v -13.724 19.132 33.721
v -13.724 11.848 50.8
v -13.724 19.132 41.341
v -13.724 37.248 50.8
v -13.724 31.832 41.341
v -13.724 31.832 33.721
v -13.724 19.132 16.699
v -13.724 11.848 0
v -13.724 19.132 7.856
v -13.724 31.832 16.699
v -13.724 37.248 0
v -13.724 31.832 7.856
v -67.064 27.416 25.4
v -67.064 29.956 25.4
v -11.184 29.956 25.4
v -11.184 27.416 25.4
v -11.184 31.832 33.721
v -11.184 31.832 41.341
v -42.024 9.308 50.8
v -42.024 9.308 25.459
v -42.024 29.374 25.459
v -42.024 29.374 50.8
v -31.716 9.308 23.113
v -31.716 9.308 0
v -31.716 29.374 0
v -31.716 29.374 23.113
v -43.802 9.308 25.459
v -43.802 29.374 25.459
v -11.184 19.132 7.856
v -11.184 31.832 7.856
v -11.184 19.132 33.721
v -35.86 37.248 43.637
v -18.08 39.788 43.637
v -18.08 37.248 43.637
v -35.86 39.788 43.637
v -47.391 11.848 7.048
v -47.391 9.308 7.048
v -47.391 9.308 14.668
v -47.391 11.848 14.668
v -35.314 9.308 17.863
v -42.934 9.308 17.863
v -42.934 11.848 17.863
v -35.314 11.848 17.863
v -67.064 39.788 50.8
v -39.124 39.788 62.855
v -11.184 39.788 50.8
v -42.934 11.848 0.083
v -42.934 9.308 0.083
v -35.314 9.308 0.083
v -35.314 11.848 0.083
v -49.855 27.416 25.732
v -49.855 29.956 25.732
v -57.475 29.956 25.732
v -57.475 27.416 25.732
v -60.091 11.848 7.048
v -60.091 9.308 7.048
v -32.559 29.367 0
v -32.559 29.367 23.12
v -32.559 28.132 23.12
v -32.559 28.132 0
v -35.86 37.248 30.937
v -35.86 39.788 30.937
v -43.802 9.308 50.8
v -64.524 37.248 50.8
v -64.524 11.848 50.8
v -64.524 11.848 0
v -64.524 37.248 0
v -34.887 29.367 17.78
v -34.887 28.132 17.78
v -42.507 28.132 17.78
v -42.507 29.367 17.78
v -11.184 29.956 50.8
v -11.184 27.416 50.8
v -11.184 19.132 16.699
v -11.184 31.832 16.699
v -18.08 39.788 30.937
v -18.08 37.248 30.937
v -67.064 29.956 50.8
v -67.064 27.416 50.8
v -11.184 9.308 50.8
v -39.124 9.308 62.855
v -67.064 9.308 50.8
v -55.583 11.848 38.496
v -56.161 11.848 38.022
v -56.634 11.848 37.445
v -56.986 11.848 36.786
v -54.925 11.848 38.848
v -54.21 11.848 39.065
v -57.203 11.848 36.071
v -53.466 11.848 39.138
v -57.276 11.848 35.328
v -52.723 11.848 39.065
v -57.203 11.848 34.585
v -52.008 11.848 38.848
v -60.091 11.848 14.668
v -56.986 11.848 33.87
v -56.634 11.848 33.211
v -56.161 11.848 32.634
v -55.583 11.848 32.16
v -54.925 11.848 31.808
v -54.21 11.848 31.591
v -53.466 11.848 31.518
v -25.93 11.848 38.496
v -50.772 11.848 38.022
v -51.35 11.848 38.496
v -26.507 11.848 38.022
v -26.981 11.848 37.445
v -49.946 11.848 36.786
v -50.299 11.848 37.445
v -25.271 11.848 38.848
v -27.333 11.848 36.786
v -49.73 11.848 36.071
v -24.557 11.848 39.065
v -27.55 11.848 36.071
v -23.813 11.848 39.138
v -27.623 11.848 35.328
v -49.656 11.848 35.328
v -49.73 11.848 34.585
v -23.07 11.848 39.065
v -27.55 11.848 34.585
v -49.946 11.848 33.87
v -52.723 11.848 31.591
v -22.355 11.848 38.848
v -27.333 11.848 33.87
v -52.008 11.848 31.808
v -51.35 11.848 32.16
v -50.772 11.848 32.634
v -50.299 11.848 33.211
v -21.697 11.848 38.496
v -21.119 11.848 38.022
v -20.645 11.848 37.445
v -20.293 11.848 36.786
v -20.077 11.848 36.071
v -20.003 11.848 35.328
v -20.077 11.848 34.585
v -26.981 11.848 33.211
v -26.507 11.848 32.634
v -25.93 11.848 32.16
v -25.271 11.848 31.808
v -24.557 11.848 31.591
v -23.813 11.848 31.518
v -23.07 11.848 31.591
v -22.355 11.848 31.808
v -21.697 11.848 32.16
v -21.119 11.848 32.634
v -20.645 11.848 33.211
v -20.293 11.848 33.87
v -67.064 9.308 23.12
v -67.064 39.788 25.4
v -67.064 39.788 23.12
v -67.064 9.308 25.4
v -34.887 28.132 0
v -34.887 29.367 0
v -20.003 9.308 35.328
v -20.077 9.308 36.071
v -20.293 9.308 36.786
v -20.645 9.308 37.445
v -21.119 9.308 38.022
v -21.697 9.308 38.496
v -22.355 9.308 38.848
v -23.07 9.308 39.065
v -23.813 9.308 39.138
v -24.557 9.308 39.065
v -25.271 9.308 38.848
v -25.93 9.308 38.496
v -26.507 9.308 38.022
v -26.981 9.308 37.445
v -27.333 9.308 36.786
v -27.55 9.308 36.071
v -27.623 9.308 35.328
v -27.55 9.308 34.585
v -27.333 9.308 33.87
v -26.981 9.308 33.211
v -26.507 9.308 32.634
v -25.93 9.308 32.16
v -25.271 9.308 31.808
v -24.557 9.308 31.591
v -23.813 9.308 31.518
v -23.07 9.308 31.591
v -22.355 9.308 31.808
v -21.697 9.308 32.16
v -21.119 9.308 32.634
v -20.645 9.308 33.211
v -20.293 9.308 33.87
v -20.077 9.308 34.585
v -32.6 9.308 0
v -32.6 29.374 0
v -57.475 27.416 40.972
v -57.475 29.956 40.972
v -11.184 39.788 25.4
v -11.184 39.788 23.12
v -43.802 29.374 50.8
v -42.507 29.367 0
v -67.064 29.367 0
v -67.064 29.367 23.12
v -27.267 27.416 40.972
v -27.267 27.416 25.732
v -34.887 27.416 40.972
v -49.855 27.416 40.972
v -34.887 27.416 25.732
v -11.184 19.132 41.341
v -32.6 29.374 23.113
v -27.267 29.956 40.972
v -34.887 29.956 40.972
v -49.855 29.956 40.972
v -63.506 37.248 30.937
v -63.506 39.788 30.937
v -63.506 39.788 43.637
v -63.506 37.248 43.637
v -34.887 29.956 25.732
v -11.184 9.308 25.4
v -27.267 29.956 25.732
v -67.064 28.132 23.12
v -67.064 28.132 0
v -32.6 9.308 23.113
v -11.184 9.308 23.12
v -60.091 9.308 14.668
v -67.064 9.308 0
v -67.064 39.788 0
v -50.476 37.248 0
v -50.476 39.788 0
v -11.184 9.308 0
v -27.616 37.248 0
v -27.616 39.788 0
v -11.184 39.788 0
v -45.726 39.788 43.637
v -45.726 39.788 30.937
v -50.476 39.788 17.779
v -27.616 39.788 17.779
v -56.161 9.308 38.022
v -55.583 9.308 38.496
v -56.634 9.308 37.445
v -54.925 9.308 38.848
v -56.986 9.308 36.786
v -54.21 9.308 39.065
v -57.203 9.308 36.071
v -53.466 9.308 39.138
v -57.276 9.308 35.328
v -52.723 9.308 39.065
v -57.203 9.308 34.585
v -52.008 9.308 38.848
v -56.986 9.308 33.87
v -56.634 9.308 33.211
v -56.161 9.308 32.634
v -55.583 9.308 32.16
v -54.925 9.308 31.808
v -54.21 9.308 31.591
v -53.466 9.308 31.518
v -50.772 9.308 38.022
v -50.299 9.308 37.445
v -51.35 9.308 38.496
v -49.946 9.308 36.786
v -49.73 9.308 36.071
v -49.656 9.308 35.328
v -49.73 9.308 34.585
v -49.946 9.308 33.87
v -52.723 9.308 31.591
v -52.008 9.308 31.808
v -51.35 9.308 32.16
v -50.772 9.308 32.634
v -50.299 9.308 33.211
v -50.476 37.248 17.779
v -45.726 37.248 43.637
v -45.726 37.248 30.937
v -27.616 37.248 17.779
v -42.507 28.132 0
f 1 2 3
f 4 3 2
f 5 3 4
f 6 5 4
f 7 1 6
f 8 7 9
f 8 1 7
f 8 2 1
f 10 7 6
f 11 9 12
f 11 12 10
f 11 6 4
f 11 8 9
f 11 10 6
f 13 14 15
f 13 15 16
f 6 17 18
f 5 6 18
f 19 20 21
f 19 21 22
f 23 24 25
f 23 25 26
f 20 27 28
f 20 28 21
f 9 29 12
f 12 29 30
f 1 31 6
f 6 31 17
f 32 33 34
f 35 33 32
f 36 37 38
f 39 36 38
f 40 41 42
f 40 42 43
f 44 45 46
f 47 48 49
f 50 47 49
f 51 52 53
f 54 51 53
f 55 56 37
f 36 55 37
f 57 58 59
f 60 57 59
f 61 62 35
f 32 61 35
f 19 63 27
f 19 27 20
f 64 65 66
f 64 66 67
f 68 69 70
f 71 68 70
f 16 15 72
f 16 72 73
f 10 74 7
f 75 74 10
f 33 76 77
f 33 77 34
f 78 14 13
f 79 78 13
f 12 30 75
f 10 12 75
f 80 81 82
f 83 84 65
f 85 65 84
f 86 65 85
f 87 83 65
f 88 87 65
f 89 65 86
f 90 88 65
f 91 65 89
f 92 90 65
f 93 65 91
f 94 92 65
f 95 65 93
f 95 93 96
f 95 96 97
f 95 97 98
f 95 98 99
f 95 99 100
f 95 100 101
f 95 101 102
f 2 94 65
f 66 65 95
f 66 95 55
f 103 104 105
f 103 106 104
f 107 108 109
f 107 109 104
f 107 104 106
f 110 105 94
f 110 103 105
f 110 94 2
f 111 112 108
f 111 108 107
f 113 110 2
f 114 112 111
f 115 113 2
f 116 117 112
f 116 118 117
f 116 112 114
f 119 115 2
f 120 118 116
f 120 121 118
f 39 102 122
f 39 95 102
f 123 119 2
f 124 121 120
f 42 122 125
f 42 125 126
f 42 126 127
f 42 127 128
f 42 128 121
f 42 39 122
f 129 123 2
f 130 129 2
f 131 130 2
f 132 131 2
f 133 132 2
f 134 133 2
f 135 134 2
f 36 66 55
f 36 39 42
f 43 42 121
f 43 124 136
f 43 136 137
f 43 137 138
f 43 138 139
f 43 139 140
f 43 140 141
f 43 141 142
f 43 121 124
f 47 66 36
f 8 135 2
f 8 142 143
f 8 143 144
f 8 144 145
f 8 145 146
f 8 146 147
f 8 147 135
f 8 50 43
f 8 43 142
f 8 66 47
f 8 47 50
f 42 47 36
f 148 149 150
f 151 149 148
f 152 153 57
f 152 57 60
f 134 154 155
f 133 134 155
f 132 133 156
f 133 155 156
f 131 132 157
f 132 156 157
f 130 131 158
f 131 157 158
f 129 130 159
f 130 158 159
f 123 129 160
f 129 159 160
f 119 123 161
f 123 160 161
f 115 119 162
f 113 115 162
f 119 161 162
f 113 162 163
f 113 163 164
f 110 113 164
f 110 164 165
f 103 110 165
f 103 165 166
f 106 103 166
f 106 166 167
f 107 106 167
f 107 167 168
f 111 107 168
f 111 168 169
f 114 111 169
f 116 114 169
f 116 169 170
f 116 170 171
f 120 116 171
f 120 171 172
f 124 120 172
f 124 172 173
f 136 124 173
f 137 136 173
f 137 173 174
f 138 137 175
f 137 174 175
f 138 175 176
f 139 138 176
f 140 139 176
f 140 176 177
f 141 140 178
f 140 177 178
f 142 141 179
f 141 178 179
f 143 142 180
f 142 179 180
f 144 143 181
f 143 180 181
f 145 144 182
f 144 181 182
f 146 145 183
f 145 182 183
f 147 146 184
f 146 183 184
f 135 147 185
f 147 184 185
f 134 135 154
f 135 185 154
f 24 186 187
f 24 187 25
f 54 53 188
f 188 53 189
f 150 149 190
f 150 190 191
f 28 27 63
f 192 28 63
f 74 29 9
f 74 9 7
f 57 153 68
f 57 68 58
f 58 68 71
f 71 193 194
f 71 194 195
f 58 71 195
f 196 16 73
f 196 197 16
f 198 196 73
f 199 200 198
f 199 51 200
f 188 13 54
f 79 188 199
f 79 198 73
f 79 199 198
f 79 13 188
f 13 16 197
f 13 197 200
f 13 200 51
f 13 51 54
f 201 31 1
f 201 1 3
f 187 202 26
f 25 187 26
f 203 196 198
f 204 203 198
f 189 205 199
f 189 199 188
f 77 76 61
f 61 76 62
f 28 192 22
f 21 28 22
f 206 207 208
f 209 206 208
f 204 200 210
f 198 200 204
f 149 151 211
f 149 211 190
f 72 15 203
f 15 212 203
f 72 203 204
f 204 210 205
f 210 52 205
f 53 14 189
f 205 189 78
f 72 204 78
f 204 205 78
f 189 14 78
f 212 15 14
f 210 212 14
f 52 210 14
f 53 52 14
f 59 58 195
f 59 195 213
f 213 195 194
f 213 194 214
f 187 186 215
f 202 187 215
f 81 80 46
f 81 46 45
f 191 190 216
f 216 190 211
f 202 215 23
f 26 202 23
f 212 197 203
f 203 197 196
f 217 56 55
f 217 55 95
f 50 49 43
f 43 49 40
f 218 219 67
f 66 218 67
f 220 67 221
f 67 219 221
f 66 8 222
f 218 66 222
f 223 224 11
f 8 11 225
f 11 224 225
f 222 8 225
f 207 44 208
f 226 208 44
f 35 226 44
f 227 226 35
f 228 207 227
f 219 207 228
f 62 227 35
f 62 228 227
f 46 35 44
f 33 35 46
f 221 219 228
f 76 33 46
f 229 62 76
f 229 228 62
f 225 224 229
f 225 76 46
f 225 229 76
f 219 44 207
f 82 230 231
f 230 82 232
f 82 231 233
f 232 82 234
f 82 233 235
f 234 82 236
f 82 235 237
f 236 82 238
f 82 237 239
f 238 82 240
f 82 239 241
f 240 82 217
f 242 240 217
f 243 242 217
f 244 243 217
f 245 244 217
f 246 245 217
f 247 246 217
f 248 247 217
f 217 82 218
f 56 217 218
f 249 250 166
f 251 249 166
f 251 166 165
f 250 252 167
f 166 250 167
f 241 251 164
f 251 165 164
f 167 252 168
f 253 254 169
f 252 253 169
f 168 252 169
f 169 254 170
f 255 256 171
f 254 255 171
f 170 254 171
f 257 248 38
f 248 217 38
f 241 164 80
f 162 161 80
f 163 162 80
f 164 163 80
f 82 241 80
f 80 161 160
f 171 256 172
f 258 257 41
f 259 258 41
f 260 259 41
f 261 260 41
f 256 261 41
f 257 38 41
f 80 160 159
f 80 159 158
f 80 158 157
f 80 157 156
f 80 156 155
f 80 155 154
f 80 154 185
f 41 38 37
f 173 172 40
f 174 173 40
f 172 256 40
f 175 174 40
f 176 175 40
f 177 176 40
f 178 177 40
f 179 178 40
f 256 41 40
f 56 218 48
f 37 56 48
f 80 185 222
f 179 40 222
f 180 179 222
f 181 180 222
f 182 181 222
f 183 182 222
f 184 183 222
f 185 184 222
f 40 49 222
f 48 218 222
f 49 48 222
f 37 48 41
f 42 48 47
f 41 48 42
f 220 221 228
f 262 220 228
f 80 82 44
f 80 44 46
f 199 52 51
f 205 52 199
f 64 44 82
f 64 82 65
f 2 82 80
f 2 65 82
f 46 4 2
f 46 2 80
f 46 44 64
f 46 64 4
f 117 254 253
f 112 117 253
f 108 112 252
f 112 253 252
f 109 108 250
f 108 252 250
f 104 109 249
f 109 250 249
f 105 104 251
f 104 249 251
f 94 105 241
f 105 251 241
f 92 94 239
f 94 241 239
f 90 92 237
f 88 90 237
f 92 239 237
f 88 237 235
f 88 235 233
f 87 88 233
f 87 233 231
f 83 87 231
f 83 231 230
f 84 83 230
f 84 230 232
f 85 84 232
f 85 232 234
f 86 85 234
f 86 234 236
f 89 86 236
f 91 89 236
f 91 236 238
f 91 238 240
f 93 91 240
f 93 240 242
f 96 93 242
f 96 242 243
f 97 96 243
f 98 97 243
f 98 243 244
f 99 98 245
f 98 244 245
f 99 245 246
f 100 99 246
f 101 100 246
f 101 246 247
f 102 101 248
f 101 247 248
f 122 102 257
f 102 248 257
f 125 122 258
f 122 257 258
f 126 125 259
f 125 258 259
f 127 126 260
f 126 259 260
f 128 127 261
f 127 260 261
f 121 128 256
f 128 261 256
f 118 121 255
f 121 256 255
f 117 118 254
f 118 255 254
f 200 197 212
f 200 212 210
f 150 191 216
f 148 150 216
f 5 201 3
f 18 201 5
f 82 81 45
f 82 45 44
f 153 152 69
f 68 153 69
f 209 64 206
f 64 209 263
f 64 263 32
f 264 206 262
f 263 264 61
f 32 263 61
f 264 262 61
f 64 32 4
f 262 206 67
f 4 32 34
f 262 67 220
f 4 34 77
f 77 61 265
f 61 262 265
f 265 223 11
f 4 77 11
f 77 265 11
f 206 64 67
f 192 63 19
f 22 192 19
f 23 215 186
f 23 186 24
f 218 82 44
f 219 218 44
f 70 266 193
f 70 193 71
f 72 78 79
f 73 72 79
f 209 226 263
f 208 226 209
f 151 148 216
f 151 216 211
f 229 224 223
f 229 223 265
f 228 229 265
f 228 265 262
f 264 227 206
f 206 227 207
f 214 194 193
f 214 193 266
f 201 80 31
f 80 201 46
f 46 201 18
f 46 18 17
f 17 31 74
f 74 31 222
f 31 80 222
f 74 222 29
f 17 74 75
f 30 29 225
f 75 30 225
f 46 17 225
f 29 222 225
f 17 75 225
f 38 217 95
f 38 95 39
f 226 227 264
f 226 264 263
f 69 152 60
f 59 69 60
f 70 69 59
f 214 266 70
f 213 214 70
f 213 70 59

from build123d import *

# Parameters (mm, degrees)
F0_W      = 55.88
F0_H      = 30.48
F0_W_2    = 50.8
F0_H_2    = 25.4
F1_DEPTH  = 50.8
F4_DEPTH  = 55.88
F3_W      = 1.2348946184
F3_H      = 23.1199190021
F5_DEPTH  = 34.5059
F2_W      = 0.8848570287
F2_H      = 23.1127515435
F6_DEPTH  = 20.066
F2_W_2    = 1.778
F2_H_2    = 25.3409488678
F2_R      = 3.81
F2_W_3    = 7.62
F2_H_3    = 17.78
F2_W_4    = 12.7
F2_H_4    = 7.62
F7_DEPTH  = 12.7
F8_DEPTH  = 30.48
F3_W_2    = 2.54
F3_H_2    = 25.4
F9_DEPTH  = 55.88
F10_W     = 7.62
F10_H     = 17.78
F10_H_2   = 15.24
F11_DEPTH = 3.81
F12_W     = 12.7
F12_H     = 7.62
F12_H_2   = 8.8426265866
F13_DEPTH = 3.048
F14_W     = 17.78
F14_H     = 12.7
F14_W_2   = 22.86
F14_H_2   = 17.7792217582
F15_DEPTH = 5.08


with BuildPart() as f1:
    # F0 (on Top) → F1 (new body)
    with BuildSketch(Plane.XY):
        with Locations((-39.1244925559, 24.5484983528)):
            Rectangle(F0_W, F0_H)
        with Locations((-39.1244925559, 24.5484983528)):
            Rectangle(F0_W_2, F0_H_2, mode=Mode.SUBTRACT)
    extrude(amount=F1_DEPTH)

    # F2 (on face) → F7 (cut)
    with BuildSketch(Plane.XZ.offset(-9.3084983528)):
        with Locations((-53.4664802253, 35.3280678391)):
            Circle(F2_R)
        with Locations((-23.8133892417, 35.3280678391)):
            Circle(F2_R)
        with Locations((-39.1244925559, 8.9734215289)):
            Rectangle(F2_W_3, F2_H_3)
        with Locations((-53.7414518952, 10.8576564579)):
            Rectangle(F2_W_4, F2_H_4)
    extrude(amount=-F7_DEPTH, mode=Mode.SUBTRACT)

    # F12 (on face) → F13 (cut)
    with BuildSketch(Plane.YZ.offset(-11.1844925559)):
        with Locations((25.4817003548, 37.5306944823)):
            Rectangle(F12_W, F12_H)
        with Locations((25.4817003548, 12.277324684)):
            Rectangle(F12_W, F12_H_2)
    extrude(amount=-F13_DEPTH, mode=Mode.SUBTRACT)

    # F14 (on face) → F15 (cut)
    with BuildSketch(Plane(origin=(0, 39.7884983528, 0), x_dir=(-1, 0, 0), z_dir=(0, 1, 0))):
        with Locations((26.9698910415, 37.2866503894)):
            Rectangle(F14_W, F14_H)
        with Locations((54.6161755919, 37.2866503894)):
            Rectangle(F14_W, F14_H)
        with Locations((39.0458321649, 8.8896108791)):
            Rectangle(F14_W_2, F14_H_2)
    extrude(amount=-F15_DEPTH, mode=Mode.SUBTRACT)


with BuildPart() as f4:
    # F3 (on face) → F4 (new body)
    with BuildSketch(Plane(origin=(-67.0644925559, 0, 0), x_dir=(0, -1, 0), z_dir=(-1, 0, 0))):
        Polygon((-29.9556218088, 25.4), (-39.7884983528, 25.4), (-39.7884983528, 23.1199190021), (-29.3668583035, 23.1199190021), (-28.1319636852, 23.1199190021), (-9.3084983528, 23.1199190021), (-9.3084983528, 25.4), (-27.4156218088, 25.4), align=None)
    extrude(amount=-F4_DEPTH)


with BuildPart() as f5:
    # F3 (on face) → F5 (new body)
    with BuildSketch(Plane(origin=(-67.0644925559, 0, 0), x_dir=(0, -1, 0), z_dir=(-1, 0, 0))):
        with Locations((-28.7494109944, 11.559959501)):
            Rectangle(F3_W, F3_H)
    extrude(amount=-F5_DEPTH)


with BuildPart() as f6:
    # F2 (on face) → F6 (new body)
    with BuildSketch(Plane.XZ.offset(-9.3084983528)):
        with Locations((-32.1580264717, 11.5563757718)):
            Rectangle(F2_W, F2_H)
    extrude(amount=-F6_DEPTH)


with BuildPart() as f6b:
    # F2 (on face) → F6, piece 2 (new body)
    with BuildSketch(Plane.XZ.offset(-9.3084983528)):
        with Locations((-42.9128897204, 38.1295255661)):
            Rectangle(F2_W_2, F2_H_2)
    extrude(amount=-F6_DEPTH)


with BuildPart() as f8:
    # F2 (on face) → F8 (new body)
    with BuildSketch(Plane.XZ.offset(-9.3084983528)):
        Polygon((-39.1244925559, 62.8553926945), (-67.0644925559, 50.8), (-43.8018897204, 50.8), (-42.0238897204, 50.8), (-11.1844925559, 50.8), align=None)
    extrude(amount=-F8_DEPTH)


with BuildPart() as f9:
    # F3 (on face) → F9 (new body)
    with BuildSketch(Plane(origin=(-67.0644925559, 0, 0), x_dir=(0, -1, 0), z_dir=(-1, 0, 0))):
        with Locations((-28.6856218088, 38.1)):
            Rectangle(F3_W_2, F3_H_2)
    extrude(amount=-F9_DEPTH)


with BuildPart() as f11_tool:
    # F10 (on face) → F11 (new body, symmetric)
    with BuildSketch(Plane(origin=(0, 29.3668583035, 0), x_dir=(-1, 0, 0), z_dir=(0, 1, 0))):
        with Locations((38.6974405026, 8.89)):
            Rectangle(F10_W, F10_H)
        with Locations((31.0774405026, 33.3521316749)):
            Rectangle(F10_W, F10_H_2)
        with Locations((53.664926765, 33.3521316749)):
            Rectangle(F10_W, F10_H_2)
    extrude(amount=F11_DEPTH, both=True)


with BuildPart() as f5_1:
    add(f5.part)

    # F11: cut by f11_tool
    add(f11_tool.part, mode=Mode.SUBTRACT)


with BuildPart() as f9_1:
    add(f9.part)

    # F11: cut by f11_tool
    add(f11_tool.part, mode=Mode.SUBTRACT)


solid = Compound([f1.part, f4.part, f6.part, f6b.part, f8.part, f5_1.part, f9_1.part])
